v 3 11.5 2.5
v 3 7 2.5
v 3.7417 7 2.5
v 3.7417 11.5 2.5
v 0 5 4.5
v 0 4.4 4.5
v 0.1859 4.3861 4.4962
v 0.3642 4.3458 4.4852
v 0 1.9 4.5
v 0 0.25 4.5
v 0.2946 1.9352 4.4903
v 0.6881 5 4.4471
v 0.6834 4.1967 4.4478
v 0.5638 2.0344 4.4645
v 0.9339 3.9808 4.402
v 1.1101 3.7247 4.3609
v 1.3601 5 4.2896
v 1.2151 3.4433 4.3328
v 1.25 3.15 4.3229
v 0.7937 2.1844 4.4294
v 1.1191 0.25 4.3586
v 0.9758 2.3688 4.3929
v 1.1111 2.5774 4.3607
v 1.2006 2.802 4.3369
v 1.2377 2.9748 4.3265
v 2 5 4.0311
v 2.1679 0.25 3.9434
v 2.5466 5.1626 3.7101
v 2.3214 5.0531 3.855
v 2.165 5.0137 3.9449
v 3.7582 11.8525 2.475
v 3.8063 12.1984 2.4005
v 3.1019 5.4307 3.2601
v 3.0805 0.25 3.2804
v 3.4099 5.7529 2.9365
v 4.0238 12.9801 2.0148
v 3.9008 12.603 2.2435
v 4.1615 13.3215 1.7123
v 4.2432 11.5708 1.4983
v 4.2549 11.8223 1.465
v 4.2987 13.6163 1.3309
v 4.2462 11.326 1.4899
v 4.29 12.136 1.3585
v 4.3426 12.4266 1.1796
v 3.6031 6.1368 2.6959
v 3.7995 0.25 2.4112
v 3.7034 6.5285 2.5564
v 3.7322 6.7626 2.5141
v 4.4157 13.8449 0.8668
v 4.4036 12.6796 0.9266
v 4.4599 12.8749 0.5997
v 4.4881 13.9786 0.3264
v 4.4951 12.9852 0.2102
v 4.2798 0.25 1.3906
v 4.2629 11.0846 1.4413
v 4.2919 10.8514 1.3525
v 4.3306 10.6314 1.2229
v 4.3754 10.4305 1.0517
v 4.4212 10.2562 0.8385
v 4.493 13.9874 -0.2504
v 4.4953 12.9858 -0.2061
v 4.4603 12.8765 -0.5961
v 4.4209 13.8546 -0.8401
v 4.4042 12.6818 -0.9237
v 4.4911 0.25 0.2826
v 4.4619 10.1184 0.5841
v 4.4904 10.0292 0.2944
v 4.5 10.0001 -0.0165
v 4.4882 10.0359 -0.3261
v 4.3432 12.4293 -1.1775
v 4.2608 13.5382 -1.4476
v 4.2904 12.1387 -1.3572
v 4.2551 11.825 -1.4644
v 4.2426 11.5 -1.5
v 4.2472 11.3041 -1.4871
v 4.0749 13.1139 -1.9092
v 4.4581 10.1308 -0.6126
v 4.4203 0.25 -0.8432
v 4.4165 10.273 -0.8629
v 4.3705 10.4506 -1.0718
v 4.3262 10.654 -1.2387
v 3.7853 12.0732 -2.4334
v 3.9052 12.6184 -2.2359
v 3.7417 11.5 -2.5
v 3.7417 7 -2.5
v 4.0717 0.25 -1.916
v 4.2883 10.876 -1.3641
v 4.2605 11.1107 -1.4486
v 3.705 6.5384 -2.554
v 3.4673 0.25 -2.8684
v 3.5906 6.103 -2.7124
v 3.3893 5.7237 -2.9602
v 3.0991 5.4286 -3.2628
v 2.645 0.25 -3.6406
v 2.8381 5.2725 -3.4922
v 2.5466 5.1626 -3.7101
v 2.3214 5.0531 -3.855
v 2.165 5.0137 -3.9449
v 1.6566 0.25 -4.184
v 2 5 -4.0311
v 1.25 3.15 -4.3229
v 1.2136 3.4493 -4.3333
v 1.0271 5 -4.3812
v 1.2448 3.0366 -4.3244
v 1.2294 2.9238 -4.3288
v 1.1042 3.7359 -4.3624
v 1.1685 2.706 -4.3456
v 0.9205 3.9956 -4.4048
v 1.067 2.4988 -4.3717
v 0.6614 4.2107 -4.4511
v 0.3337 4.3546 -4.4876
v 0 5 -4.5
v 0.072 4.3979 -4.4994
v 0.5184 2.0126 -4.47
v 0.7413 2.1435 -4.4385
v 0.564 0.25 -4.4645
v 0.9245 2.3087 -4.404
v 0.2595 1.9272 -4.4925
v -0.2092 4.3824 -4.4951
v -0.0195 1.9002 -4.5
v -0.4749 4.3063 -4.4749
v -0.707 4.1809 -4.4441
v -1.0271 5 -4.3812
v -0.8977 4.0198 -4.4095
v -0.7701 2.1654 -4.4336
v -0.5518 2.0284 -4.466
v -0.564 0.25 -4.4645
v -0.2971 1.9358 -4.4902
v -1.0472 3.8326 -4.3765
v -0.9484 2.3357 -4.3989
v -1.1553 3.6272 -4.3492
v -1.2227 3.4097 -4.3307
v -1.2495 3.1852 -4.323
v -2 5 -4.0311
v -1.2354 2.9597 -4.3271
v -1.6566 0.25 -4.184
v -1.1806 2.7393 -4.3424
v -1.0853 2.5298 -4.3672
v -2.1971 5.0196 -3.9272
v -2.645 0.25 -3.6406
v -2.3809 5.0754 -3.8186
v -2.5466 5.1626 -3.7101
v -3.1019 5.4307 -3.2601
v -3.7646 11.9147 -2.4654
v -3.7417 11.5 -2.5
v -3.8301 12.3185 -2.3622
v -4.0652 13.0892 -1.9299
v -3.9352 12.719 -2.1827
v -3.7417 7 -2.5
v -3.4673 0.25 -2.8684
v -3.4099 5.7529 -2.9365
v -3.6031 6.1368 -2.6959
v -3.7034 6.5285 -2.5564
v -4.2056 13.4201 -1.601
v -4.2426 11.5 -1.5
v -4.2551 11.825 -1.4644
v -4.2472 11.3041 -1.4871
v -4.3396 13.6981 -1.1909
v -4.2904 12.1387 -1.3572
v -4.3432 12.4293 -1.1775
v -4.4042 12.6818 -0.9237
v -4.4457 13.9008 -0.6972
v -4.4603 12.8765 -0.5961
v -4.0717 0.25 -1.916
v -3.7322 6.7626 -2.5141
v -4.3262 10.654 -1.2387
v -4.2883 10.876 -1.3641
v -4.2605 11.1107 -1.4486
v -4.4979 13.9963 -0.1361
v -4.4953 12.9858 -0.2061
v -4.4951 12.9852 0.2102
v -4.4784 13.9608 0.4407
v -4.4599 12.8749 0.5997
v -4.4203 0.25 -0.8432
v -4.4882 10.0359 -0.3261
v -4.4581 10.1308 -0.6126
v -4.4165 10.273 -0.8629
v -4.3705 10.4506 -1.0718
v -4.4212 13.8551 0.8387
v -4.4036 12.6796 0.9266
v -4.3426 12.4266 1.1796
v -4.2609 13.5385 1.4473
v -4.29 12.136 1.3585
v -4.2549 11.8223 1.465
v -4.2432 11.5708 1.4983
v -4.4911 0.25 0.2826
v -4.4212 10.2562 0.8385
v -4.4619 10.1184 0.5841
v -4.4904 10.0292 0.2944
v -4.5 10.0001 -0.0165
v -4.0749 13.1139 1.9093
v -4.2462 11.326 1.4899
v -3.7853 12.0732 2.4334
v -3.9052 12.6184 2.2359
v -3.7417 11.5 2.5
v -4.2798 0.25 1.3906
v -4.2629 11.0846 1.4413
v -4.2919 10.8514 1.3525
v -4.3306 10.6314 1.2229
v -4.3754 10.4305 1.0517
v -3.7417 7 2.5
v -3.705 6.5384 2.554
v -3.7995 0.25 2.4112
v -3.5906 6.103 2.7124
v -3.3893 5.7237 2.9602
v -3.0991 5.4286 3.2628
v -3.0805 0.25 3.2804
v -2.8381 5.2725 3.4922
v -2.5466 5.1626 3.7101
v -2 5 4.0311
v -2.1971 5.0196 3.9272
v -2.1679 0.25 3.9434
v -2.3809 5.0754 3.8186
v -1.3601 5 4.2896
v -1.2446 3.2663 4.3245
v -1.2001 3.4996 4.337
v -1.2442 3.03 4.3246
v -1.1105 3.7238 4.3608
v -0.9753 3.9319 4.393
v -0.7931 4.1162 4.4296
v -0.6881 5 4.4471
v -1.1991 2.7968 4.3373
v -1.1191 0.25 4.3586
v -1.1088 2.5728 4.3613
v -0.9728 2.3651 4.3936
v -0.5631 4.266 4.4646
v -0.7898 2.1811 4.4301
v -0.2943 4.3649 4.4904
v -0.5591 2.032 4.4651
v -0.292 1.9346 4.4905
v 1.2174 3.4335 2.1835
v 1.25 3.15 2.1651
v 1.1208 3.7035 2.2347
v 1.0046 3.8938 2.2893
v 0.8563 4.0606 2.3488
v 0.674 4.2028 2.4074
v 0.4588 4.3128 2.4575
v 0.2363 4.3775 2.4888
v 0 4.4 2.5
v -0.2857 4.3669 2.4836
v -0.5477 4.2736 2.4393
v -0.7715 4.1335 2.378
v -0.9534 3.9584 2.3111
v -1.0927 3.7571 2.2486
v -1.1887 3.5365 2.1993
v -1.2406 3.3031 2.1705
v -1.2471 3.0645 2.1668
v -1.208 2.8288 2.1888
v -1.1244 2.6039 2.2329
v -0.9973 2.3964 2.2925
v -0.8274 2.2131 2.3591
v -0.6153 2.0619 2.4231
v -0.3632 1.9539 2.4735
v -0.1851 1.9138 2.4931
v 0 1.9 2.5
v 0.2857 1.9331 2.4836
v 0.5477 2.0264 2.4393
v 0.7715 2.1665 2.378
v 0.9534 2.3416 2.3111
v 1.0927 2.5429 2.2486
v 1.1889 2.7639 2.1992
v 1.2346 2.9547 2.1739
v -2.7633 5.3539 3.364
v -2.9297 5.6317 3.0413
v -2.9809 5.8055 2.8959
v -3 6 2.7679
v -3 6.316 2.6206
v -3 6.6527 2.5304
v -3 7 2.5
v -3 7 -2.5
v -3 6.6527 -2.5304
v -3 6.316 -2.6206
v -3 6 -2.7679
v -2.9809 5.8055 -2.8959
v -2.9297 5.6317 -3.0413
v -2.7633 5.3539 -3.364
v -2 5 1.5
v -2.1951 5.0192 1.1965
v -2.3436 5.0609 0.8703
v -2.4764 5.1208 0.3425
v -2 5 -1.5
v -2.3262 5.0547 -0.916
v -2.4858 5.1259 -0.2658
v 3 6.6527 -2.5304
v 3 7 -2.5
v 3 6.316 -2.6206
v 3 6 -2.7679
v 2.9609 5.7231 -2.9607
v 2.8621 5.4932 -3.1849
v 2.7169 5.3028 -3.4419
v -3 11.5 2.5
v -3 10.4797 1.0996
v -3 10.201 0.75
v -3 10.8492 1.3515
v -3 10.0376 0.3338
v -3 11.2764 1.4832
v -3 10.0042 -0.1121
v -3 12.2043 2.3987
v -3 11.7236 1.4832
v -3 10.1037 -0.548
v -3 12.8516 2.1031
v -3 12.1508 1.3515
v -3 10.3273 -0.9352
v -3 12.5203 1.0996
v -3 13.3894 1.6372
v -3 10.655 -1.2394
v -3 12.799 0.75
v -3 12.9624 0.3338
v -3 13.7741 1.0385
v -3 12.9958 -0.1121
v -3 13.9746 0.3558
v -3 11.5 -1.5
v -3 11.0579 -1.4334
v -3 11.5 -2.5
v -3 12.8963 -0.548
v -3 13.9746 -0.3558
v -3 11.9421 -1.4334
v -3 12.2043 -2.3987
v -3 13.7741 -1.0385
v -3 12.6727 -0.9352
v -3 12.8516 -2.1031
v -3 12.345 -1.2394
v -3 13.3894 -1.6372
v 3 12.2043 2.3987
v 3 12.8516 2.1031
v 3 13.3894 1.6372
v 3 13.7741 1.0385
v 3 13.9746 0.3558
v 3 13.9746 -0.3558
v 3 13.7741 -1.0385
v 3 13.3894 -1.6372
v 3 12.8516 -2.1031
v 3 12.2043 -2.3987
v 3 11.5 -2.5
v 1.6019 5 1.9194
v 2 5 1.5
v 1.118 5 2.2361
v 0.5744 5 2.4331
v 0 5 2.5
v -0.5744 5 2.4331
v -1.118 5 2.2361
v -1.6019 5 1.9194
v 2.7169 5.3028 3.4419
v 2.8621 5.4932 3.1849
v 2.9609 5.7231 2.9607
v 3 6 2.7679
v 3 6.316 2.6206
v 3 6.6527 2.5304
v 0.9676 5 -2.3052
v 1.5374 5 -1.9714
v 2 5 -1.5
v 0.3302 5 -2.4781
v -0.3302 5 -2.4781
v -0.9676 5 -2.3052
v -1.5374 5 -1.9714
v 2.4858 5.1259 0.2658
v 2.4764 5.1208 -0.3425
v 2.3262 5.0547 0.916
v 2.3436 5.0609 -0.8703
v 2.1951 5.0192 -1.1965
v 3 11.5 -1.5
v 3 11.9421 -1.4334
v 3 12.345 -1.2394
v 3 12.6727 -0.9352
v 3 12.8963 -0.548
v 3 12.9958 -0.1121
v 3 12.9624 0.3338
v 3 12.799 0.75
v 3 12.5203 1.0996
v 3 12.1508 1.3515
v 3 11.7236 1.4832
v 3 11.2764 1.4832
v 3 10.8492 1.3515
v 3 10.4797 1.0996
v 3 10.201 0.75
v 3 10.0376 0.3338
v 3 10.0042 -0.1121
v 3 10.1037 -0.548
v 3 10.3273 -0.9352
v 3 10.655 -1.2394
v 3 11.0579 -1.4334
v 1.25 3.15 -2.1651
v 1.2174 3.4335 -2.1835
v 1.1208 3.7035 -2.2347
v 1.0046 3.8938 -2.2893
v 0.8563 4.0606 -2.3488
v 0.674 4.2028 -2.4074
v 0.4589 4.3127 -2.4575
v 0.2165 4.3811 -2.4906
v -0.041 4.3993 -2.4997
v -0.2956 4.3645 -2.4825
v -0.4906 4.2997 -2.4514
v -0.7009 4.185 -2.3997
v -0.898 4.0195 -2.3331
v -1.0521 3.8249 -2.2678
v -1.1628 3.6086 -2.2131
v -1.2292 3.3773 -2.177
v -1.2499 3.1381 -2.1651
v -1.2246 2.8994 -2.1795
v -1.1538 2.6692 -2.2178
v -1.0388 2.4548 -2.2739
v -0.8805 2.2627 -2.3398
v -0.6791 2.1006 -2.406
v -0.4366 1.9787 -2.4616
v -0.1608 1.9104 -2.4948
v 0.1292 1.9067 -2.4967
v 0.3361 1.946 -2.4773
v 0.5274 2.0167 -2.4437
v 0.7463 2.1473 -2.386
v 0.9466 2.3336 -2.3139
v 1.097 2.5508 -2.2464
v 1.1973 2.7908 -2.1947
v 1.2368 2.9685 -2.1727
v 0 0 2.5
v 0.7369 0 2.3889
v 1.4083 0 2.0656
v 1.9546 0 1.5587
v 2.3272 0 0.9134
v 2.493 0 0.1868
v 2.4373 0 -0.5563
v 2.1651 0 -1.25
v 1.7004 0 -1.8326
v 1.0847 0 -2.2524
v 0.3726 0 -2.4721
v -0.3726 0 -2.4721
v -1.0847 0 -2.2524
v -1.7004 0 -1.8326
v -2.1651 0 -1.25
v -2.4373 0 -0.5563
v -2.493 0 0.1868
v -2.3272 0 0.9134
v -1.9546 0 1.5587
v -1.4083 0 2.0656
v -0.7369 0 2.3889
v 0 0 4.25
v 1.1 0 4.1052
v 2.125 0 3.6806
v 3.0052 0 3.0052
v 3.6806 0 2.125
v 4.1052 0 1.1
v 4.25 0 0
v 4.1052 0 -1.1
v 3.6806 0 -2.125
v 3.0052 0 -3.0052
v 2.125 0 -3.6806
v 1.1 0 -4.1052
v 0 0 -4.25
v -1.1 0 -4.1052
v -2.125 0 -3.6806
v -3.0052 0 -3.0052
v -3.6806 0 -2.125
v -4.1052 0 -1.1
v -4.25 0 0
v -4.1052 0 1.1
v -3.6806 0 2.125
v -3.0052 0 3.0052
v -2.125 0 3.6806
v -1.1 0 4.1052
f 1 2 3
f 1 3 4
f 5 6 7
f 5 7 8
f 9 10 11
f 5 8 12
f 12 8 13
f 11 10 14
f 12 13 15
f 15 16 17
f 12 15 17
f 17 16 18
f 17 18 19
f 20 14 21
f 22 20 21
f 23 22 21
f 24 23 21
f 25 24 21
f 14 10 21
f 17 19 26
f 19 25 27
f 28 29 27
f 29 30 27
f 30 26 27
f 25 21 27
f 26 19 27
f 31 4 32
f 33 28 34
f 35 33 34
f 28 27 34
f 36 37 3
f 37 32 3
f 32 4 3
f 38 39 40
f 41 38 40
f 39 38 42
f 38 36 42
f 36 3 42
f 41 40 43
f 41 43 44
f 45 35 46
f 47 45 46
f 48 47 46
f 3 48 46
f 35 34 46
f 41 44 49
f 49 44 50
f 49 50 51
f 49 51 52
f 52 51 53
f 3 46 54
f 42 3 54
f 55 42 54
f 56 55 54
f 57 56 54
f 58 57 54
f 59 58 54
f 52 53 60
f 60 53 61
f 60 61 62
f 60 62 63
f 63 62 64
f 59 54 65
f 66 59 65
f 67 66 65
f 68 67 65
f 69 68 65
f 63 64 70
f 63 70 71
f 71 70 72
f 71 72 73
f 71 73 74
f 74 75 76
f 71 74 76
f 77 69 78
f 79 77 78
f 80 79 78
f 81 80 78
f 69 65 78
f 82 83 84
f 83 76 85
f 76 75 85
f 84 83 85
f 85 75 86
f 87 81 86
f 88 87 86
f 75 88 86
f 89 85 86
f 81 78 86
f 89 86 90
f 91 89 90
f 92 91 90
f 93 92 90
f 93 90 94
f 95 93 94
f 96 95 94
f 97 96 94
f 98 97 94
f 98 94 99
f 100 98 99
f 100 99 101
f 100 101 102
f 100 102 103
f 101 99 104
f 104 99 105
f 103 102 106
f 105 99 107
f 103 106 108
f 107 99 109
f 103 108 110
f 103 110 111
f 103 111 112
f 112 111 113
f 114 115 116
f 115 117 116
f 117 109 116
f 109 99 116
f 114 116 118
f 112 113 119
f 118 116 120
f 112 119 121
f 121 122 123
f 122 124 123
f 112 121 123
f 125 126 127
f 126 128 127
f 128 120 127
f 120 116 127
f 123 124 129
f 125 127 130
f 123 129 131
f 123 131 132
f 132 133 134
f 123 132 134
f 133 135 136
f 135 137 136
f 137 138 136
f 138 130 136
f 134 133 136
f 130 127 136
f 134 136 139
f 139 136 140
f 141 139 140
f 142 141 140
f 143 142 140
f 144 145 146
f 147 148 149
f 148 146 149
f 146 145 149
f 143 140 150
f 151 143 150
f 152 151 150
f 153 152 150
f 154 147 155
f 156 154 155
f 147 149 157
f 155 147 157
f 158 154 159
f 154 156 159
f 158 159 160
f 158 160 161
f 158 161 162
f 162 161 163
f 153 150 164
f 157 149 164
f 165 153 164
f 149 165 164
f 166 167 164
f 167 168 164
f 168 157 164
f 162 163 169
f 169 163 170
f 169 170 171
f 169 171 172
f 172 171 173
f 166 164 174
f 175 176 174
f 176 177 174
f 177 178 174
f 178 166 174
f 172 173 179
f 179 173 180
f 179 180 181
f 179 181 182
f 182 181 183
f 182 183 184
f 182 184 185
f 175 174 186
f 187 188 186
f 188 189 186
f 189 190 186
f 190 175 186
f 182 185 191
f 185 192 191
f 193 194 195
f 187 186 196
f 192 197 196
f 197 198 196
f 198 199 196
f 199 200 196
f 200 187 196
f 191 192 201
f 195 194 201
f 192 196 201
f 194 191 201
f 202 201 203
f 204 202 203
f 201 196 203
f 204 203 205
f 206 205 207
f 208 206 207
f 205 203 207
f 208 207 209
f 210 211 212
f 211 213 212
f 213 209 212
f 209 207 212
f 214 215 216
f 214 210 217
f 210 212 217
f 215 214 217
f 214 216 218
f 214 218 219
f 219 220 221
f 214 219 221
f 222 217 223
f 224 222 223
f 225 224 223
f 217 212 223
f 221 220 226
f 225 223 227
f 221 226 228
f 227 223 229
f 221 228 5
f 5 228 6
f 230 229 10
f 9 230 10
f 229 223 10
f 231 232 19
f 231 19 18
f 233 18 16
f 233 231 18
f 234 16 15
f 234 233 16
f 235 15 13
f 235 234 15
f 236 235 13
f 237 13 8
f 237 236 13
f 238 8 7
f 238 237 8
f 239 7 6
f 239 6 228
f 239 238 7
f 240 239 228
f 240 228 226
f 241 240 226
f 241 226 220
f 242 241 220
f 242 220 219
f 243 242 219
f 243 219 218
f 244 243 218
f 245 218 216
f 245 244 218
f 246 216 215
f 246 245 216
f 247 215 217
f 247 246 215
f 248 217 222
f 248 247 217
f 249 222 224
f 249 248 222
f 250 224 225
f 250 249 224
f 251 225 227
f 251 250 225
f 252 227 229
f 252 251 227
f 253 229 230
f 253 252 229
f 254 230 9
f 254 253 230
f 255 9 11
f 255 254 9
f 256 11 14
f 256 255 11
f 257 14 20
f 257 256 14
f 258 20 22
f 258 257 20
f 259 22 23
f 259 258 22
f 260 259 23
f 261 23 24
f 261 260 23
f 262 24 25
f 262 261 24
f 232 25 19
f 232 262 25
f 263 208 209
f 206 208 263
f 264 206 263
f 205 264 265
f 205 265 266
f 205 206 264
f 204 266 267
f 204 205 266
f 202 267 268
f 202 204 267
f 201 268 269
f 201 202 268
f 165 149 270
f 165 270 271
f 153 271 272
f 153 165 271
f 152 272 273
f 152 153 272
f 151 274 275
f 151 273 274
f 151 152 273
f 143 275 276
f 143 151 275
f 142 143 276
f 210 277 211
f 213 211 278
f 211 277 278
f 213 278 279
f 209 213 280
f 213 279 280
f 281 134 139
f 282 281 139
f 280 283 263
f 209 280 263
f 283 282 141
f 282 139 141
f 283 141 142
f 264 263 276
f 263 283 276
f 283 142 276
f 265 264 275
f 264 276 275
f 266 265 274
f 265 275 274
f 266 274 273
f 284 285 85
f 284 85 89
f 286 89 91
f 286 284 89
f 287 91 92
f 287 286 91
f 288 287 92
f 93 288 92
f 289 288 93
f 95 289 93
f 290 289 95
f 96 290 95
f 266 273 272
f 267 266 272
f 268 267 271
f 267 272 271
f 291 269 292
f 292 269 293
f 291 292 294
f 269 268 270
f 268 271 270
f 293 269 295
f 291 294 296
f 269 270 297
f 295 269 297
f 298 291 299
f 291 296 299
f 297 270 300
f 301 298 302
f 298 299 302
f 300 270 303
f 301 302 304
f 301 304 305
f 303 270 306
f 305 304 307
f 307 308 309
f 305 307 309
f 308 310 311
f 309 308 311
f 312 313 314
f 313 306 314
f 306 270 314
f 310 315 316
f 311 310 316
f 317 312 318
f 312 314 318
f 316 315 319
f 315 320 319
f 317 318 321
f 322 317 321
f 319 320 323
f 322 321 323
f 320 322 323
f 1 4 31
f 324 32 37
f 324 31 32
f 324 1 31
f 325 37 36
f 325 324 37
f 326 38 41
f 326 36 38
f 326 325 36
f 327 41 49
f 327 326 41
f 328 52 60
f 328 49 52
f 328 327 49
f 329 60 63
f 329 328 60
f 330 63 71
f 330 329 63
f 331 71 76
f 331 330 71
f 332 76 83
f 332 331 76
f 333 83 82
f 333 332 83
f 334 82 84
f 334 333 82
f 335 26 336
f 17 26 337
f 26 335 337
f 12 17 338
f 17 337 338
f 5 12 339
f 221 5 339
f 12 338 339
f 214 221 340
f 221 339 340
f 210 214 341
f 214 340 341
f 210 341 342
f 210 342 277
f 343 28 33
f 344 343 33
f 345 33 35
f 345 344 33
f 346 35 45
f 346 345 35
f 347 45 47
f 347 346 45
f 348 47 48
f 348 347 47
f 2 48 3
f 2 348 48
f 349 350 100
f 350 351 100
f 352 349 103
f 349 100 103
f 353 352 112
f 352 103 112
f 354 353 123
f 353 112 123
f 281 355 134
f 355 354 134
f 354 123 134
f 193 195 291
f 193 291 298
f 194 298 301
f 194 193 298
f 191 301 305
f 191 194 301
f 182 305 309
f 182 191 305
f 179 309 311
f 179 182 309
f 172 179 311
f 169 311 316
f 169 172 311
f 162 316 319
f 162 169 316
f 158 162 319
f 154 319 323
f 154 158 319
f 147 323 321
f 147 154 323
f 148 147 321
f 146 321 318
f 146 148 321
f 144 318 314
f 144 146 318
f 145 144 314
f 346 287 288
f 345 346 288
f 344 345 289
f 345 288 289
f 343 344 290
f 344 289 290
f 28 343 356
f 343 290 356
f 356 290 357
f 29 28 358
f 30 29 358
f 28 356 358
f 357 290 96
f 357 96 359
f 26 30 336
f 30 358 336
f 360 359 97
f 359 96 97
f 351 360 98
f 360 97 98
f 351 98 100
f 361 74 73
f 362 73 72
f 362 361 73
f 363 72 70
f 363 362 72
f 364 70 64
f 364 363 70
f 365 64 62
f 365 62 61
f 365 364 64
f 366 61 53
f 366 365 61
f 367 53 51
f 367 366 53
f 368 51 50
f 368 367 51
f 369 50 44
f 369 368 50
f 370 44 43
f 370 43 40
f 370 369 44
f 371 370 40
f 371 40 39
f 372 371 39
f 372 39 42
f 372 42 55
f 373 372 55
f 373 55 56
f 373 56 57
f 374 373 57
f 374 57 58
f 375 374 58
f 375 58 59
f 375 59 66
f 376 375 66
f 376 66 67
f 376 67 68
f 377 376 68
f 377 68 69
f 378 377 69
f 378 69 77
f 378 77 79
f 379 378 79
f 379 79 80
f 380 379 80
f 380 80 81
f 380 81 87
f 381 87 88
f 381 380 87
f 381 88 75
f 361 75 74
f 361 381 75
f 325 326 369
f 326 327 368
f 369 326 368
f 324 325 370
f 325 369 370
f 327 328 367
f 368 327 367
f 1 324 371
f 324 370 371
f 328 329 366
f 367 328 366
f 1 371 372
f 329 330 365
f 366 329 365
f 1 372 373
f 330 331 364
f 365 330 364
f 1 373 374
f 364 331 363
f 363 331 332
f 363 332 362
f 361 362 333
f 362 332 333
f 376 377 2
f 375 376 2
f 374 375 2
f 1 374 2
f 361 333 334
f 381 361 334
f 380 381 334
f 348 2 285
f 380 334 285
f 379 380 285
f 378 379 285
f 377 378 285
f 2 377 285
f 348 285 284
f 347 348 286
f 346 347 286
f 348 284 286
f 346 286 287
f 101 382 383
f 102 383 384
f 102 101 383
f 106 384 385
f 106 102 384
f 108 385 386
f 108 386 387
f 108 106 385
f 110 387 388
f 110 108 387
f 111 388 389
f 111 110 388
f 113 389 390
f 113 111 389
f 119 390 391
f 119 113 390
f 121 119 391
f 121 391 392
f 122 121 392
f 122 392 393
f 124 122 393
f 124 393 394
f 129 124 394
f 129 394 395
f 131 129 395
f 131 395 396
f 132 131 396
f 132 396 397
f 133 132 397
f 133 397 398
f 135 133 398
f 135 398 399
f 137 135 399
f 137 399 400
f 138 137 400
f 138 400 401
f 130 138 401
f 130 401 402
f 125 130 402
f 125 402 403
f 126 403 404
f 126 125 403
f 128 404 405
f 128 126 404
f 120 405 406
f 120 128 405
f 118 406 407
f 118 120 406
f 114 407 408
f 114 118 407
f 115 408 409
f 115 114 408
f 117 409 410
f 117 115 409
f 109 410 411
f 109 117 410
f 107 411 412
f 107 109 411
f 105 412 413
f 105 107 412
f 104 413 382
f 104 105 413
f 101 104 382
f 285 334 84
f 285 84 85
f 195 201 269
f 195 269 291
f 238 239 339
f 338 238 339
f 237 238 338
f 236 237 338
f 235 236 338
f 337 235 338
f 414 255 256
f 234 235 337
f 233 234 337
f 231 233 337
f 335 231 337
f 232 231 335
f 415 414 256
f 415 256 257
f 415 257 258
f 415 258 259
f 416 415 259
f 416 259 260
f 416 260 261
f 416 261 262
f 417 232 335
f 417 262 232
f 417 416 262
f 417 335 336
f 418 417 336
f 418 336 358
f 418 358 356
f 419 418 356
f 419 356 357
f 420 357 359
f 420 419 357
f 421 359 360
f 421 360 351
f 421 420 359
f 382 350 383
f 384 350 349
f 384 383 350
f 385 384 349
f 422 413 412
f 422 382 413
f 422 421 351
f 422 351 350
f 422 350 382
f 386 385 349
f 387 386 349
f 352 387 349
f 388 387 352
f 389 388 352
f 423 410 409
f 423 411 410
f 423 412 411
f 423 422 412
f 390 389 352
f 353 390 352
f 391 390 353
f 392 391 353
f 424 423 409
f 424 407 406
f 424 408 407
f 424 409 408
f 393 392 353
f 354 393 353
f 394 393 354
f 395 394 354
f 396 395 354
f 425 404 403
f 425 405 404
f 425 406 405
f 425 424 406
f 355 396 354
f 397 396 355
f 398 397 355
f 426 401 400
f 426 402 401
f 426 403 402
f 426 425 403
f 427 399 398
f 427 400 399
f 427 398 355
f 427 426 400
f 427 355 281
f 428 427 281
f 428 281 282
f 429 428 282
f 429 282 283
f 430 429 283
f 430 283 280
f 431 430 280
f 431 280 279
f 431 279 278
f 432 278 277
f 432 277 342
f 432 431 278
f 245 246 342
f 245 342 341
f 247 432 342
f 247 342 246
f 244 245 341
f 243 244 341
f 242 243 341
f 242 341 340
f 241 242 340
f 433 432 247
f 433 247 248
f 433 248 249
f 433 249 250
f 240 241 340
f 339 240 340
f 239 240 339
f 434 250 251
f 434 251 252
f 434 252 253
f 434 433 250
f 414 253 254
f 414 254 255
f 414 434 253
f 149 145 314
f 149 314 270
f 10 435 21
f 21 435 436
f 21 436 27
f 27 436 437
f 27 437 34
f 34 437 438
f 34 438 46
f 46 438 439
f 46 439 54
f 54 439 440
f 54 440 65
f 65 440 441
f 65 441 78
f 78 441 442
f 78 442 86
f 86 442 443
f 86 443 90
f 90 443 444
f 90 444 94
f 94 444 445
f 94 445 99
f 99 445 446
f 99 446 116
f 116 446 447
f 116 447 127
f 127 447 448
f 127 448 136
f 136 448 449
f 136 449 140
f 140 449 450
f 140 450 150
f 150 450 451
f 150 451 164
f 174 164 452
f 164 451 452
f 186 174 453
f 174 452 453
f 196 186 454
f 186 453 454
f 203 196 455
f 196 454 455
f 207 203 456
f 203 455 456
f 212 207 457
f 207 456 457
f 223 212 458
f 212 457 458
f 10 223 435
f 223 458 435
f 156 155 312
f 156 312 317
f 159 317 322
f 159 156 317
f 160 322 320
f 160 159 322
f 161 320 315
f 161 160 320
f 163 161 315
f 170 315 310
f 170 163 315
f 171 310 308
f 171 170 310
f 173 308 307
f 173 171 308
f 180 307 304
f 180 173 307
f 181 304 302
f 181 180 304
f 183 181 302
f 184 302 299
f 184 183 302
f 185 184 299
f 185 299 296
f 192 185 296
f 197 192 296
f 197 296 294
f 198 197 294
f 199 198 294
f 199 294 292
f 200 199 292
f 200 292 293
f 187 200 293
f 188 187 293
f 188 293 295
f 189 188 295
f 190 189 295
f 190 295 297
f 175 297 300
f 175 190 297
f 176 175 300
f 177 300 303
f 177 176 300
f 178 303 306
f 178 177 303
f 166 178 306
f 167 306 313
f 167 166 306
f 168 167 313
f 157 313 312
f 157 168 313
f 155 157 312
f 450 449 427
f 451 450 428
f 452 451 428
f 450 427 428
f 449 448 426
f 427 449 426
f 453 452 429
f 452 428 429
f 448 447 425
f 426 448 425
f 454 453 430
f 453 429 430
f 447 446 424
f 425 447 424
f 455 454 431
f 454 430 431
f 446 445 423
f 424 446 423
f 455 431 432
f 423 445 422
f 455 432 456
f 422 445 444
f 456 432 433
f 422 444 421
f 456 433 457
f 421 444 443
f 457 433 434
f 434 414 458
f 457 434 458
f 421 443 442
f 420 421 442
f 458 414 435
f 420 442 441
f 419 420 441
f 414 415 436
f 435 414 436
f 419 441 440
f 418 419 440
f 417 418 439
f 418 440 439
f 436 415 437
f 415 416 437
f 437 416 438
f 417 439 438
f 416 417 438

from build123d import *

# Parameters (mm, degrees)
SKETCH1_R               = 4.5
SKETCH1_R_2             = 2.5
BOSS_EXTRUDE1_DEPTH     = 14
CUT_EXTRUDE1_DEPTH      = 16.378556499
CUT_EXTRUDE1_DEPTH_BACK = 16.378556499
SKETCH2_R               = 1.25
CUT_EXTRUDE2_DEPTH      = 16.378556652
CUT_EXTRUDE2_DEPTH_BACK = 16.378556652
SKETCH3_R               = 1.5
CHAMFER1_SIZE           = 0.25


with BuildPart() as part:
    # Sketch1 → Boss-Extrude1 (new body)
    with BuildSketch(Plane(origin=(0, 0, 0), x_dir=(1, 0, 0), z_dir=(0, 1, 0))):
        with Locations(Location((0, 0, 0), (0, 0, 270))):
            Circle(SKETCH1_R)
        with Locations(Location((0, 0, 0), (0, 0, 270))):
            Circle(SKETCH1_R_2, mode=Mode.SUBTRACT)
    extrude(amount=BOSS_EXTRUDE1_DEPTH)

    # Sketch2 → Cut-Extrude1 (cut, two sides: drawn at the far end of the back side and taken through both)
    with BuildSketch(Plane.XY.offset(-CUT_EXTRUDE1_DEPTH_BACK)):
        with Locations((0, 3.15)):
            Circle(SKETCH2_R)
        with BuildLine():
            Line((-3, 14), (3, 14))
            Line((3, 14), (3, 6))
            ThreePointArc((3, 6), (2.707106781, 5.292893219), (2, 5))
            Line((2, 5), (-2, 5))
            ThreePointArc((-2, 5), (-2.707106781, 5.292893219), (-3, 6))
            Line((-3, 6), (-3, 14))
        make_face()
    extrude(amount=CUT_EXTRUDE1_DEPTH + CUT_EXTRUDE1_DEPTH_BACK, mode=Mode.SUBTRACT)

    # Sketch3 → Cut-Extrude2 (cut, two sides: drawn at the far end of the back side and taken through both)
    with BuildSketch(Plane(origin=(0, 0, 0), x_dir=(0, 0, -1), z_dir=(1, 0, 0)).offset(-CUT_EXTRUDE2_DEPTH_BACK)):
        with Locations((0, 11.5)):
            Circle(SKETCH3_R)
        with BuildLine():
            Line((2.5, 11.5), (2.5, 7))
            ThreePointArc((2.5, 7), (3.085786438, 5.585786438), (4.5, 5))
            Line((4.5, 5), (4.5, 15))
            Line((4.5, 15), (-4.5, 15))
            Line((-4.5, 15), (-4.5, 5))
            ThreePointArc((-4.5, 5), (-3.085786438, 5.585786438), (-2.5, 7))
            Line((-2.5, 7), (-2.5, 11.5))
            ThreePointArc((-2.5, 11.5), (0, 14), (2.5, 11.5))
        make_face()
    extrude(amount=CUT_EXTRUDE2_DEPTH + CUT_EXTRUDE2_DEPTH_BACK, mode=Mode.SUBTRACT)

    # Chamfer1
    chamfer1_edges = [part.edges().sort_by_distance(p)[0] for p in [
        (0, 0, -4.5),
    ]]
    chamfer(chamfer1_edges, length=CHAMFER1_SIZE)


solid = part.part
